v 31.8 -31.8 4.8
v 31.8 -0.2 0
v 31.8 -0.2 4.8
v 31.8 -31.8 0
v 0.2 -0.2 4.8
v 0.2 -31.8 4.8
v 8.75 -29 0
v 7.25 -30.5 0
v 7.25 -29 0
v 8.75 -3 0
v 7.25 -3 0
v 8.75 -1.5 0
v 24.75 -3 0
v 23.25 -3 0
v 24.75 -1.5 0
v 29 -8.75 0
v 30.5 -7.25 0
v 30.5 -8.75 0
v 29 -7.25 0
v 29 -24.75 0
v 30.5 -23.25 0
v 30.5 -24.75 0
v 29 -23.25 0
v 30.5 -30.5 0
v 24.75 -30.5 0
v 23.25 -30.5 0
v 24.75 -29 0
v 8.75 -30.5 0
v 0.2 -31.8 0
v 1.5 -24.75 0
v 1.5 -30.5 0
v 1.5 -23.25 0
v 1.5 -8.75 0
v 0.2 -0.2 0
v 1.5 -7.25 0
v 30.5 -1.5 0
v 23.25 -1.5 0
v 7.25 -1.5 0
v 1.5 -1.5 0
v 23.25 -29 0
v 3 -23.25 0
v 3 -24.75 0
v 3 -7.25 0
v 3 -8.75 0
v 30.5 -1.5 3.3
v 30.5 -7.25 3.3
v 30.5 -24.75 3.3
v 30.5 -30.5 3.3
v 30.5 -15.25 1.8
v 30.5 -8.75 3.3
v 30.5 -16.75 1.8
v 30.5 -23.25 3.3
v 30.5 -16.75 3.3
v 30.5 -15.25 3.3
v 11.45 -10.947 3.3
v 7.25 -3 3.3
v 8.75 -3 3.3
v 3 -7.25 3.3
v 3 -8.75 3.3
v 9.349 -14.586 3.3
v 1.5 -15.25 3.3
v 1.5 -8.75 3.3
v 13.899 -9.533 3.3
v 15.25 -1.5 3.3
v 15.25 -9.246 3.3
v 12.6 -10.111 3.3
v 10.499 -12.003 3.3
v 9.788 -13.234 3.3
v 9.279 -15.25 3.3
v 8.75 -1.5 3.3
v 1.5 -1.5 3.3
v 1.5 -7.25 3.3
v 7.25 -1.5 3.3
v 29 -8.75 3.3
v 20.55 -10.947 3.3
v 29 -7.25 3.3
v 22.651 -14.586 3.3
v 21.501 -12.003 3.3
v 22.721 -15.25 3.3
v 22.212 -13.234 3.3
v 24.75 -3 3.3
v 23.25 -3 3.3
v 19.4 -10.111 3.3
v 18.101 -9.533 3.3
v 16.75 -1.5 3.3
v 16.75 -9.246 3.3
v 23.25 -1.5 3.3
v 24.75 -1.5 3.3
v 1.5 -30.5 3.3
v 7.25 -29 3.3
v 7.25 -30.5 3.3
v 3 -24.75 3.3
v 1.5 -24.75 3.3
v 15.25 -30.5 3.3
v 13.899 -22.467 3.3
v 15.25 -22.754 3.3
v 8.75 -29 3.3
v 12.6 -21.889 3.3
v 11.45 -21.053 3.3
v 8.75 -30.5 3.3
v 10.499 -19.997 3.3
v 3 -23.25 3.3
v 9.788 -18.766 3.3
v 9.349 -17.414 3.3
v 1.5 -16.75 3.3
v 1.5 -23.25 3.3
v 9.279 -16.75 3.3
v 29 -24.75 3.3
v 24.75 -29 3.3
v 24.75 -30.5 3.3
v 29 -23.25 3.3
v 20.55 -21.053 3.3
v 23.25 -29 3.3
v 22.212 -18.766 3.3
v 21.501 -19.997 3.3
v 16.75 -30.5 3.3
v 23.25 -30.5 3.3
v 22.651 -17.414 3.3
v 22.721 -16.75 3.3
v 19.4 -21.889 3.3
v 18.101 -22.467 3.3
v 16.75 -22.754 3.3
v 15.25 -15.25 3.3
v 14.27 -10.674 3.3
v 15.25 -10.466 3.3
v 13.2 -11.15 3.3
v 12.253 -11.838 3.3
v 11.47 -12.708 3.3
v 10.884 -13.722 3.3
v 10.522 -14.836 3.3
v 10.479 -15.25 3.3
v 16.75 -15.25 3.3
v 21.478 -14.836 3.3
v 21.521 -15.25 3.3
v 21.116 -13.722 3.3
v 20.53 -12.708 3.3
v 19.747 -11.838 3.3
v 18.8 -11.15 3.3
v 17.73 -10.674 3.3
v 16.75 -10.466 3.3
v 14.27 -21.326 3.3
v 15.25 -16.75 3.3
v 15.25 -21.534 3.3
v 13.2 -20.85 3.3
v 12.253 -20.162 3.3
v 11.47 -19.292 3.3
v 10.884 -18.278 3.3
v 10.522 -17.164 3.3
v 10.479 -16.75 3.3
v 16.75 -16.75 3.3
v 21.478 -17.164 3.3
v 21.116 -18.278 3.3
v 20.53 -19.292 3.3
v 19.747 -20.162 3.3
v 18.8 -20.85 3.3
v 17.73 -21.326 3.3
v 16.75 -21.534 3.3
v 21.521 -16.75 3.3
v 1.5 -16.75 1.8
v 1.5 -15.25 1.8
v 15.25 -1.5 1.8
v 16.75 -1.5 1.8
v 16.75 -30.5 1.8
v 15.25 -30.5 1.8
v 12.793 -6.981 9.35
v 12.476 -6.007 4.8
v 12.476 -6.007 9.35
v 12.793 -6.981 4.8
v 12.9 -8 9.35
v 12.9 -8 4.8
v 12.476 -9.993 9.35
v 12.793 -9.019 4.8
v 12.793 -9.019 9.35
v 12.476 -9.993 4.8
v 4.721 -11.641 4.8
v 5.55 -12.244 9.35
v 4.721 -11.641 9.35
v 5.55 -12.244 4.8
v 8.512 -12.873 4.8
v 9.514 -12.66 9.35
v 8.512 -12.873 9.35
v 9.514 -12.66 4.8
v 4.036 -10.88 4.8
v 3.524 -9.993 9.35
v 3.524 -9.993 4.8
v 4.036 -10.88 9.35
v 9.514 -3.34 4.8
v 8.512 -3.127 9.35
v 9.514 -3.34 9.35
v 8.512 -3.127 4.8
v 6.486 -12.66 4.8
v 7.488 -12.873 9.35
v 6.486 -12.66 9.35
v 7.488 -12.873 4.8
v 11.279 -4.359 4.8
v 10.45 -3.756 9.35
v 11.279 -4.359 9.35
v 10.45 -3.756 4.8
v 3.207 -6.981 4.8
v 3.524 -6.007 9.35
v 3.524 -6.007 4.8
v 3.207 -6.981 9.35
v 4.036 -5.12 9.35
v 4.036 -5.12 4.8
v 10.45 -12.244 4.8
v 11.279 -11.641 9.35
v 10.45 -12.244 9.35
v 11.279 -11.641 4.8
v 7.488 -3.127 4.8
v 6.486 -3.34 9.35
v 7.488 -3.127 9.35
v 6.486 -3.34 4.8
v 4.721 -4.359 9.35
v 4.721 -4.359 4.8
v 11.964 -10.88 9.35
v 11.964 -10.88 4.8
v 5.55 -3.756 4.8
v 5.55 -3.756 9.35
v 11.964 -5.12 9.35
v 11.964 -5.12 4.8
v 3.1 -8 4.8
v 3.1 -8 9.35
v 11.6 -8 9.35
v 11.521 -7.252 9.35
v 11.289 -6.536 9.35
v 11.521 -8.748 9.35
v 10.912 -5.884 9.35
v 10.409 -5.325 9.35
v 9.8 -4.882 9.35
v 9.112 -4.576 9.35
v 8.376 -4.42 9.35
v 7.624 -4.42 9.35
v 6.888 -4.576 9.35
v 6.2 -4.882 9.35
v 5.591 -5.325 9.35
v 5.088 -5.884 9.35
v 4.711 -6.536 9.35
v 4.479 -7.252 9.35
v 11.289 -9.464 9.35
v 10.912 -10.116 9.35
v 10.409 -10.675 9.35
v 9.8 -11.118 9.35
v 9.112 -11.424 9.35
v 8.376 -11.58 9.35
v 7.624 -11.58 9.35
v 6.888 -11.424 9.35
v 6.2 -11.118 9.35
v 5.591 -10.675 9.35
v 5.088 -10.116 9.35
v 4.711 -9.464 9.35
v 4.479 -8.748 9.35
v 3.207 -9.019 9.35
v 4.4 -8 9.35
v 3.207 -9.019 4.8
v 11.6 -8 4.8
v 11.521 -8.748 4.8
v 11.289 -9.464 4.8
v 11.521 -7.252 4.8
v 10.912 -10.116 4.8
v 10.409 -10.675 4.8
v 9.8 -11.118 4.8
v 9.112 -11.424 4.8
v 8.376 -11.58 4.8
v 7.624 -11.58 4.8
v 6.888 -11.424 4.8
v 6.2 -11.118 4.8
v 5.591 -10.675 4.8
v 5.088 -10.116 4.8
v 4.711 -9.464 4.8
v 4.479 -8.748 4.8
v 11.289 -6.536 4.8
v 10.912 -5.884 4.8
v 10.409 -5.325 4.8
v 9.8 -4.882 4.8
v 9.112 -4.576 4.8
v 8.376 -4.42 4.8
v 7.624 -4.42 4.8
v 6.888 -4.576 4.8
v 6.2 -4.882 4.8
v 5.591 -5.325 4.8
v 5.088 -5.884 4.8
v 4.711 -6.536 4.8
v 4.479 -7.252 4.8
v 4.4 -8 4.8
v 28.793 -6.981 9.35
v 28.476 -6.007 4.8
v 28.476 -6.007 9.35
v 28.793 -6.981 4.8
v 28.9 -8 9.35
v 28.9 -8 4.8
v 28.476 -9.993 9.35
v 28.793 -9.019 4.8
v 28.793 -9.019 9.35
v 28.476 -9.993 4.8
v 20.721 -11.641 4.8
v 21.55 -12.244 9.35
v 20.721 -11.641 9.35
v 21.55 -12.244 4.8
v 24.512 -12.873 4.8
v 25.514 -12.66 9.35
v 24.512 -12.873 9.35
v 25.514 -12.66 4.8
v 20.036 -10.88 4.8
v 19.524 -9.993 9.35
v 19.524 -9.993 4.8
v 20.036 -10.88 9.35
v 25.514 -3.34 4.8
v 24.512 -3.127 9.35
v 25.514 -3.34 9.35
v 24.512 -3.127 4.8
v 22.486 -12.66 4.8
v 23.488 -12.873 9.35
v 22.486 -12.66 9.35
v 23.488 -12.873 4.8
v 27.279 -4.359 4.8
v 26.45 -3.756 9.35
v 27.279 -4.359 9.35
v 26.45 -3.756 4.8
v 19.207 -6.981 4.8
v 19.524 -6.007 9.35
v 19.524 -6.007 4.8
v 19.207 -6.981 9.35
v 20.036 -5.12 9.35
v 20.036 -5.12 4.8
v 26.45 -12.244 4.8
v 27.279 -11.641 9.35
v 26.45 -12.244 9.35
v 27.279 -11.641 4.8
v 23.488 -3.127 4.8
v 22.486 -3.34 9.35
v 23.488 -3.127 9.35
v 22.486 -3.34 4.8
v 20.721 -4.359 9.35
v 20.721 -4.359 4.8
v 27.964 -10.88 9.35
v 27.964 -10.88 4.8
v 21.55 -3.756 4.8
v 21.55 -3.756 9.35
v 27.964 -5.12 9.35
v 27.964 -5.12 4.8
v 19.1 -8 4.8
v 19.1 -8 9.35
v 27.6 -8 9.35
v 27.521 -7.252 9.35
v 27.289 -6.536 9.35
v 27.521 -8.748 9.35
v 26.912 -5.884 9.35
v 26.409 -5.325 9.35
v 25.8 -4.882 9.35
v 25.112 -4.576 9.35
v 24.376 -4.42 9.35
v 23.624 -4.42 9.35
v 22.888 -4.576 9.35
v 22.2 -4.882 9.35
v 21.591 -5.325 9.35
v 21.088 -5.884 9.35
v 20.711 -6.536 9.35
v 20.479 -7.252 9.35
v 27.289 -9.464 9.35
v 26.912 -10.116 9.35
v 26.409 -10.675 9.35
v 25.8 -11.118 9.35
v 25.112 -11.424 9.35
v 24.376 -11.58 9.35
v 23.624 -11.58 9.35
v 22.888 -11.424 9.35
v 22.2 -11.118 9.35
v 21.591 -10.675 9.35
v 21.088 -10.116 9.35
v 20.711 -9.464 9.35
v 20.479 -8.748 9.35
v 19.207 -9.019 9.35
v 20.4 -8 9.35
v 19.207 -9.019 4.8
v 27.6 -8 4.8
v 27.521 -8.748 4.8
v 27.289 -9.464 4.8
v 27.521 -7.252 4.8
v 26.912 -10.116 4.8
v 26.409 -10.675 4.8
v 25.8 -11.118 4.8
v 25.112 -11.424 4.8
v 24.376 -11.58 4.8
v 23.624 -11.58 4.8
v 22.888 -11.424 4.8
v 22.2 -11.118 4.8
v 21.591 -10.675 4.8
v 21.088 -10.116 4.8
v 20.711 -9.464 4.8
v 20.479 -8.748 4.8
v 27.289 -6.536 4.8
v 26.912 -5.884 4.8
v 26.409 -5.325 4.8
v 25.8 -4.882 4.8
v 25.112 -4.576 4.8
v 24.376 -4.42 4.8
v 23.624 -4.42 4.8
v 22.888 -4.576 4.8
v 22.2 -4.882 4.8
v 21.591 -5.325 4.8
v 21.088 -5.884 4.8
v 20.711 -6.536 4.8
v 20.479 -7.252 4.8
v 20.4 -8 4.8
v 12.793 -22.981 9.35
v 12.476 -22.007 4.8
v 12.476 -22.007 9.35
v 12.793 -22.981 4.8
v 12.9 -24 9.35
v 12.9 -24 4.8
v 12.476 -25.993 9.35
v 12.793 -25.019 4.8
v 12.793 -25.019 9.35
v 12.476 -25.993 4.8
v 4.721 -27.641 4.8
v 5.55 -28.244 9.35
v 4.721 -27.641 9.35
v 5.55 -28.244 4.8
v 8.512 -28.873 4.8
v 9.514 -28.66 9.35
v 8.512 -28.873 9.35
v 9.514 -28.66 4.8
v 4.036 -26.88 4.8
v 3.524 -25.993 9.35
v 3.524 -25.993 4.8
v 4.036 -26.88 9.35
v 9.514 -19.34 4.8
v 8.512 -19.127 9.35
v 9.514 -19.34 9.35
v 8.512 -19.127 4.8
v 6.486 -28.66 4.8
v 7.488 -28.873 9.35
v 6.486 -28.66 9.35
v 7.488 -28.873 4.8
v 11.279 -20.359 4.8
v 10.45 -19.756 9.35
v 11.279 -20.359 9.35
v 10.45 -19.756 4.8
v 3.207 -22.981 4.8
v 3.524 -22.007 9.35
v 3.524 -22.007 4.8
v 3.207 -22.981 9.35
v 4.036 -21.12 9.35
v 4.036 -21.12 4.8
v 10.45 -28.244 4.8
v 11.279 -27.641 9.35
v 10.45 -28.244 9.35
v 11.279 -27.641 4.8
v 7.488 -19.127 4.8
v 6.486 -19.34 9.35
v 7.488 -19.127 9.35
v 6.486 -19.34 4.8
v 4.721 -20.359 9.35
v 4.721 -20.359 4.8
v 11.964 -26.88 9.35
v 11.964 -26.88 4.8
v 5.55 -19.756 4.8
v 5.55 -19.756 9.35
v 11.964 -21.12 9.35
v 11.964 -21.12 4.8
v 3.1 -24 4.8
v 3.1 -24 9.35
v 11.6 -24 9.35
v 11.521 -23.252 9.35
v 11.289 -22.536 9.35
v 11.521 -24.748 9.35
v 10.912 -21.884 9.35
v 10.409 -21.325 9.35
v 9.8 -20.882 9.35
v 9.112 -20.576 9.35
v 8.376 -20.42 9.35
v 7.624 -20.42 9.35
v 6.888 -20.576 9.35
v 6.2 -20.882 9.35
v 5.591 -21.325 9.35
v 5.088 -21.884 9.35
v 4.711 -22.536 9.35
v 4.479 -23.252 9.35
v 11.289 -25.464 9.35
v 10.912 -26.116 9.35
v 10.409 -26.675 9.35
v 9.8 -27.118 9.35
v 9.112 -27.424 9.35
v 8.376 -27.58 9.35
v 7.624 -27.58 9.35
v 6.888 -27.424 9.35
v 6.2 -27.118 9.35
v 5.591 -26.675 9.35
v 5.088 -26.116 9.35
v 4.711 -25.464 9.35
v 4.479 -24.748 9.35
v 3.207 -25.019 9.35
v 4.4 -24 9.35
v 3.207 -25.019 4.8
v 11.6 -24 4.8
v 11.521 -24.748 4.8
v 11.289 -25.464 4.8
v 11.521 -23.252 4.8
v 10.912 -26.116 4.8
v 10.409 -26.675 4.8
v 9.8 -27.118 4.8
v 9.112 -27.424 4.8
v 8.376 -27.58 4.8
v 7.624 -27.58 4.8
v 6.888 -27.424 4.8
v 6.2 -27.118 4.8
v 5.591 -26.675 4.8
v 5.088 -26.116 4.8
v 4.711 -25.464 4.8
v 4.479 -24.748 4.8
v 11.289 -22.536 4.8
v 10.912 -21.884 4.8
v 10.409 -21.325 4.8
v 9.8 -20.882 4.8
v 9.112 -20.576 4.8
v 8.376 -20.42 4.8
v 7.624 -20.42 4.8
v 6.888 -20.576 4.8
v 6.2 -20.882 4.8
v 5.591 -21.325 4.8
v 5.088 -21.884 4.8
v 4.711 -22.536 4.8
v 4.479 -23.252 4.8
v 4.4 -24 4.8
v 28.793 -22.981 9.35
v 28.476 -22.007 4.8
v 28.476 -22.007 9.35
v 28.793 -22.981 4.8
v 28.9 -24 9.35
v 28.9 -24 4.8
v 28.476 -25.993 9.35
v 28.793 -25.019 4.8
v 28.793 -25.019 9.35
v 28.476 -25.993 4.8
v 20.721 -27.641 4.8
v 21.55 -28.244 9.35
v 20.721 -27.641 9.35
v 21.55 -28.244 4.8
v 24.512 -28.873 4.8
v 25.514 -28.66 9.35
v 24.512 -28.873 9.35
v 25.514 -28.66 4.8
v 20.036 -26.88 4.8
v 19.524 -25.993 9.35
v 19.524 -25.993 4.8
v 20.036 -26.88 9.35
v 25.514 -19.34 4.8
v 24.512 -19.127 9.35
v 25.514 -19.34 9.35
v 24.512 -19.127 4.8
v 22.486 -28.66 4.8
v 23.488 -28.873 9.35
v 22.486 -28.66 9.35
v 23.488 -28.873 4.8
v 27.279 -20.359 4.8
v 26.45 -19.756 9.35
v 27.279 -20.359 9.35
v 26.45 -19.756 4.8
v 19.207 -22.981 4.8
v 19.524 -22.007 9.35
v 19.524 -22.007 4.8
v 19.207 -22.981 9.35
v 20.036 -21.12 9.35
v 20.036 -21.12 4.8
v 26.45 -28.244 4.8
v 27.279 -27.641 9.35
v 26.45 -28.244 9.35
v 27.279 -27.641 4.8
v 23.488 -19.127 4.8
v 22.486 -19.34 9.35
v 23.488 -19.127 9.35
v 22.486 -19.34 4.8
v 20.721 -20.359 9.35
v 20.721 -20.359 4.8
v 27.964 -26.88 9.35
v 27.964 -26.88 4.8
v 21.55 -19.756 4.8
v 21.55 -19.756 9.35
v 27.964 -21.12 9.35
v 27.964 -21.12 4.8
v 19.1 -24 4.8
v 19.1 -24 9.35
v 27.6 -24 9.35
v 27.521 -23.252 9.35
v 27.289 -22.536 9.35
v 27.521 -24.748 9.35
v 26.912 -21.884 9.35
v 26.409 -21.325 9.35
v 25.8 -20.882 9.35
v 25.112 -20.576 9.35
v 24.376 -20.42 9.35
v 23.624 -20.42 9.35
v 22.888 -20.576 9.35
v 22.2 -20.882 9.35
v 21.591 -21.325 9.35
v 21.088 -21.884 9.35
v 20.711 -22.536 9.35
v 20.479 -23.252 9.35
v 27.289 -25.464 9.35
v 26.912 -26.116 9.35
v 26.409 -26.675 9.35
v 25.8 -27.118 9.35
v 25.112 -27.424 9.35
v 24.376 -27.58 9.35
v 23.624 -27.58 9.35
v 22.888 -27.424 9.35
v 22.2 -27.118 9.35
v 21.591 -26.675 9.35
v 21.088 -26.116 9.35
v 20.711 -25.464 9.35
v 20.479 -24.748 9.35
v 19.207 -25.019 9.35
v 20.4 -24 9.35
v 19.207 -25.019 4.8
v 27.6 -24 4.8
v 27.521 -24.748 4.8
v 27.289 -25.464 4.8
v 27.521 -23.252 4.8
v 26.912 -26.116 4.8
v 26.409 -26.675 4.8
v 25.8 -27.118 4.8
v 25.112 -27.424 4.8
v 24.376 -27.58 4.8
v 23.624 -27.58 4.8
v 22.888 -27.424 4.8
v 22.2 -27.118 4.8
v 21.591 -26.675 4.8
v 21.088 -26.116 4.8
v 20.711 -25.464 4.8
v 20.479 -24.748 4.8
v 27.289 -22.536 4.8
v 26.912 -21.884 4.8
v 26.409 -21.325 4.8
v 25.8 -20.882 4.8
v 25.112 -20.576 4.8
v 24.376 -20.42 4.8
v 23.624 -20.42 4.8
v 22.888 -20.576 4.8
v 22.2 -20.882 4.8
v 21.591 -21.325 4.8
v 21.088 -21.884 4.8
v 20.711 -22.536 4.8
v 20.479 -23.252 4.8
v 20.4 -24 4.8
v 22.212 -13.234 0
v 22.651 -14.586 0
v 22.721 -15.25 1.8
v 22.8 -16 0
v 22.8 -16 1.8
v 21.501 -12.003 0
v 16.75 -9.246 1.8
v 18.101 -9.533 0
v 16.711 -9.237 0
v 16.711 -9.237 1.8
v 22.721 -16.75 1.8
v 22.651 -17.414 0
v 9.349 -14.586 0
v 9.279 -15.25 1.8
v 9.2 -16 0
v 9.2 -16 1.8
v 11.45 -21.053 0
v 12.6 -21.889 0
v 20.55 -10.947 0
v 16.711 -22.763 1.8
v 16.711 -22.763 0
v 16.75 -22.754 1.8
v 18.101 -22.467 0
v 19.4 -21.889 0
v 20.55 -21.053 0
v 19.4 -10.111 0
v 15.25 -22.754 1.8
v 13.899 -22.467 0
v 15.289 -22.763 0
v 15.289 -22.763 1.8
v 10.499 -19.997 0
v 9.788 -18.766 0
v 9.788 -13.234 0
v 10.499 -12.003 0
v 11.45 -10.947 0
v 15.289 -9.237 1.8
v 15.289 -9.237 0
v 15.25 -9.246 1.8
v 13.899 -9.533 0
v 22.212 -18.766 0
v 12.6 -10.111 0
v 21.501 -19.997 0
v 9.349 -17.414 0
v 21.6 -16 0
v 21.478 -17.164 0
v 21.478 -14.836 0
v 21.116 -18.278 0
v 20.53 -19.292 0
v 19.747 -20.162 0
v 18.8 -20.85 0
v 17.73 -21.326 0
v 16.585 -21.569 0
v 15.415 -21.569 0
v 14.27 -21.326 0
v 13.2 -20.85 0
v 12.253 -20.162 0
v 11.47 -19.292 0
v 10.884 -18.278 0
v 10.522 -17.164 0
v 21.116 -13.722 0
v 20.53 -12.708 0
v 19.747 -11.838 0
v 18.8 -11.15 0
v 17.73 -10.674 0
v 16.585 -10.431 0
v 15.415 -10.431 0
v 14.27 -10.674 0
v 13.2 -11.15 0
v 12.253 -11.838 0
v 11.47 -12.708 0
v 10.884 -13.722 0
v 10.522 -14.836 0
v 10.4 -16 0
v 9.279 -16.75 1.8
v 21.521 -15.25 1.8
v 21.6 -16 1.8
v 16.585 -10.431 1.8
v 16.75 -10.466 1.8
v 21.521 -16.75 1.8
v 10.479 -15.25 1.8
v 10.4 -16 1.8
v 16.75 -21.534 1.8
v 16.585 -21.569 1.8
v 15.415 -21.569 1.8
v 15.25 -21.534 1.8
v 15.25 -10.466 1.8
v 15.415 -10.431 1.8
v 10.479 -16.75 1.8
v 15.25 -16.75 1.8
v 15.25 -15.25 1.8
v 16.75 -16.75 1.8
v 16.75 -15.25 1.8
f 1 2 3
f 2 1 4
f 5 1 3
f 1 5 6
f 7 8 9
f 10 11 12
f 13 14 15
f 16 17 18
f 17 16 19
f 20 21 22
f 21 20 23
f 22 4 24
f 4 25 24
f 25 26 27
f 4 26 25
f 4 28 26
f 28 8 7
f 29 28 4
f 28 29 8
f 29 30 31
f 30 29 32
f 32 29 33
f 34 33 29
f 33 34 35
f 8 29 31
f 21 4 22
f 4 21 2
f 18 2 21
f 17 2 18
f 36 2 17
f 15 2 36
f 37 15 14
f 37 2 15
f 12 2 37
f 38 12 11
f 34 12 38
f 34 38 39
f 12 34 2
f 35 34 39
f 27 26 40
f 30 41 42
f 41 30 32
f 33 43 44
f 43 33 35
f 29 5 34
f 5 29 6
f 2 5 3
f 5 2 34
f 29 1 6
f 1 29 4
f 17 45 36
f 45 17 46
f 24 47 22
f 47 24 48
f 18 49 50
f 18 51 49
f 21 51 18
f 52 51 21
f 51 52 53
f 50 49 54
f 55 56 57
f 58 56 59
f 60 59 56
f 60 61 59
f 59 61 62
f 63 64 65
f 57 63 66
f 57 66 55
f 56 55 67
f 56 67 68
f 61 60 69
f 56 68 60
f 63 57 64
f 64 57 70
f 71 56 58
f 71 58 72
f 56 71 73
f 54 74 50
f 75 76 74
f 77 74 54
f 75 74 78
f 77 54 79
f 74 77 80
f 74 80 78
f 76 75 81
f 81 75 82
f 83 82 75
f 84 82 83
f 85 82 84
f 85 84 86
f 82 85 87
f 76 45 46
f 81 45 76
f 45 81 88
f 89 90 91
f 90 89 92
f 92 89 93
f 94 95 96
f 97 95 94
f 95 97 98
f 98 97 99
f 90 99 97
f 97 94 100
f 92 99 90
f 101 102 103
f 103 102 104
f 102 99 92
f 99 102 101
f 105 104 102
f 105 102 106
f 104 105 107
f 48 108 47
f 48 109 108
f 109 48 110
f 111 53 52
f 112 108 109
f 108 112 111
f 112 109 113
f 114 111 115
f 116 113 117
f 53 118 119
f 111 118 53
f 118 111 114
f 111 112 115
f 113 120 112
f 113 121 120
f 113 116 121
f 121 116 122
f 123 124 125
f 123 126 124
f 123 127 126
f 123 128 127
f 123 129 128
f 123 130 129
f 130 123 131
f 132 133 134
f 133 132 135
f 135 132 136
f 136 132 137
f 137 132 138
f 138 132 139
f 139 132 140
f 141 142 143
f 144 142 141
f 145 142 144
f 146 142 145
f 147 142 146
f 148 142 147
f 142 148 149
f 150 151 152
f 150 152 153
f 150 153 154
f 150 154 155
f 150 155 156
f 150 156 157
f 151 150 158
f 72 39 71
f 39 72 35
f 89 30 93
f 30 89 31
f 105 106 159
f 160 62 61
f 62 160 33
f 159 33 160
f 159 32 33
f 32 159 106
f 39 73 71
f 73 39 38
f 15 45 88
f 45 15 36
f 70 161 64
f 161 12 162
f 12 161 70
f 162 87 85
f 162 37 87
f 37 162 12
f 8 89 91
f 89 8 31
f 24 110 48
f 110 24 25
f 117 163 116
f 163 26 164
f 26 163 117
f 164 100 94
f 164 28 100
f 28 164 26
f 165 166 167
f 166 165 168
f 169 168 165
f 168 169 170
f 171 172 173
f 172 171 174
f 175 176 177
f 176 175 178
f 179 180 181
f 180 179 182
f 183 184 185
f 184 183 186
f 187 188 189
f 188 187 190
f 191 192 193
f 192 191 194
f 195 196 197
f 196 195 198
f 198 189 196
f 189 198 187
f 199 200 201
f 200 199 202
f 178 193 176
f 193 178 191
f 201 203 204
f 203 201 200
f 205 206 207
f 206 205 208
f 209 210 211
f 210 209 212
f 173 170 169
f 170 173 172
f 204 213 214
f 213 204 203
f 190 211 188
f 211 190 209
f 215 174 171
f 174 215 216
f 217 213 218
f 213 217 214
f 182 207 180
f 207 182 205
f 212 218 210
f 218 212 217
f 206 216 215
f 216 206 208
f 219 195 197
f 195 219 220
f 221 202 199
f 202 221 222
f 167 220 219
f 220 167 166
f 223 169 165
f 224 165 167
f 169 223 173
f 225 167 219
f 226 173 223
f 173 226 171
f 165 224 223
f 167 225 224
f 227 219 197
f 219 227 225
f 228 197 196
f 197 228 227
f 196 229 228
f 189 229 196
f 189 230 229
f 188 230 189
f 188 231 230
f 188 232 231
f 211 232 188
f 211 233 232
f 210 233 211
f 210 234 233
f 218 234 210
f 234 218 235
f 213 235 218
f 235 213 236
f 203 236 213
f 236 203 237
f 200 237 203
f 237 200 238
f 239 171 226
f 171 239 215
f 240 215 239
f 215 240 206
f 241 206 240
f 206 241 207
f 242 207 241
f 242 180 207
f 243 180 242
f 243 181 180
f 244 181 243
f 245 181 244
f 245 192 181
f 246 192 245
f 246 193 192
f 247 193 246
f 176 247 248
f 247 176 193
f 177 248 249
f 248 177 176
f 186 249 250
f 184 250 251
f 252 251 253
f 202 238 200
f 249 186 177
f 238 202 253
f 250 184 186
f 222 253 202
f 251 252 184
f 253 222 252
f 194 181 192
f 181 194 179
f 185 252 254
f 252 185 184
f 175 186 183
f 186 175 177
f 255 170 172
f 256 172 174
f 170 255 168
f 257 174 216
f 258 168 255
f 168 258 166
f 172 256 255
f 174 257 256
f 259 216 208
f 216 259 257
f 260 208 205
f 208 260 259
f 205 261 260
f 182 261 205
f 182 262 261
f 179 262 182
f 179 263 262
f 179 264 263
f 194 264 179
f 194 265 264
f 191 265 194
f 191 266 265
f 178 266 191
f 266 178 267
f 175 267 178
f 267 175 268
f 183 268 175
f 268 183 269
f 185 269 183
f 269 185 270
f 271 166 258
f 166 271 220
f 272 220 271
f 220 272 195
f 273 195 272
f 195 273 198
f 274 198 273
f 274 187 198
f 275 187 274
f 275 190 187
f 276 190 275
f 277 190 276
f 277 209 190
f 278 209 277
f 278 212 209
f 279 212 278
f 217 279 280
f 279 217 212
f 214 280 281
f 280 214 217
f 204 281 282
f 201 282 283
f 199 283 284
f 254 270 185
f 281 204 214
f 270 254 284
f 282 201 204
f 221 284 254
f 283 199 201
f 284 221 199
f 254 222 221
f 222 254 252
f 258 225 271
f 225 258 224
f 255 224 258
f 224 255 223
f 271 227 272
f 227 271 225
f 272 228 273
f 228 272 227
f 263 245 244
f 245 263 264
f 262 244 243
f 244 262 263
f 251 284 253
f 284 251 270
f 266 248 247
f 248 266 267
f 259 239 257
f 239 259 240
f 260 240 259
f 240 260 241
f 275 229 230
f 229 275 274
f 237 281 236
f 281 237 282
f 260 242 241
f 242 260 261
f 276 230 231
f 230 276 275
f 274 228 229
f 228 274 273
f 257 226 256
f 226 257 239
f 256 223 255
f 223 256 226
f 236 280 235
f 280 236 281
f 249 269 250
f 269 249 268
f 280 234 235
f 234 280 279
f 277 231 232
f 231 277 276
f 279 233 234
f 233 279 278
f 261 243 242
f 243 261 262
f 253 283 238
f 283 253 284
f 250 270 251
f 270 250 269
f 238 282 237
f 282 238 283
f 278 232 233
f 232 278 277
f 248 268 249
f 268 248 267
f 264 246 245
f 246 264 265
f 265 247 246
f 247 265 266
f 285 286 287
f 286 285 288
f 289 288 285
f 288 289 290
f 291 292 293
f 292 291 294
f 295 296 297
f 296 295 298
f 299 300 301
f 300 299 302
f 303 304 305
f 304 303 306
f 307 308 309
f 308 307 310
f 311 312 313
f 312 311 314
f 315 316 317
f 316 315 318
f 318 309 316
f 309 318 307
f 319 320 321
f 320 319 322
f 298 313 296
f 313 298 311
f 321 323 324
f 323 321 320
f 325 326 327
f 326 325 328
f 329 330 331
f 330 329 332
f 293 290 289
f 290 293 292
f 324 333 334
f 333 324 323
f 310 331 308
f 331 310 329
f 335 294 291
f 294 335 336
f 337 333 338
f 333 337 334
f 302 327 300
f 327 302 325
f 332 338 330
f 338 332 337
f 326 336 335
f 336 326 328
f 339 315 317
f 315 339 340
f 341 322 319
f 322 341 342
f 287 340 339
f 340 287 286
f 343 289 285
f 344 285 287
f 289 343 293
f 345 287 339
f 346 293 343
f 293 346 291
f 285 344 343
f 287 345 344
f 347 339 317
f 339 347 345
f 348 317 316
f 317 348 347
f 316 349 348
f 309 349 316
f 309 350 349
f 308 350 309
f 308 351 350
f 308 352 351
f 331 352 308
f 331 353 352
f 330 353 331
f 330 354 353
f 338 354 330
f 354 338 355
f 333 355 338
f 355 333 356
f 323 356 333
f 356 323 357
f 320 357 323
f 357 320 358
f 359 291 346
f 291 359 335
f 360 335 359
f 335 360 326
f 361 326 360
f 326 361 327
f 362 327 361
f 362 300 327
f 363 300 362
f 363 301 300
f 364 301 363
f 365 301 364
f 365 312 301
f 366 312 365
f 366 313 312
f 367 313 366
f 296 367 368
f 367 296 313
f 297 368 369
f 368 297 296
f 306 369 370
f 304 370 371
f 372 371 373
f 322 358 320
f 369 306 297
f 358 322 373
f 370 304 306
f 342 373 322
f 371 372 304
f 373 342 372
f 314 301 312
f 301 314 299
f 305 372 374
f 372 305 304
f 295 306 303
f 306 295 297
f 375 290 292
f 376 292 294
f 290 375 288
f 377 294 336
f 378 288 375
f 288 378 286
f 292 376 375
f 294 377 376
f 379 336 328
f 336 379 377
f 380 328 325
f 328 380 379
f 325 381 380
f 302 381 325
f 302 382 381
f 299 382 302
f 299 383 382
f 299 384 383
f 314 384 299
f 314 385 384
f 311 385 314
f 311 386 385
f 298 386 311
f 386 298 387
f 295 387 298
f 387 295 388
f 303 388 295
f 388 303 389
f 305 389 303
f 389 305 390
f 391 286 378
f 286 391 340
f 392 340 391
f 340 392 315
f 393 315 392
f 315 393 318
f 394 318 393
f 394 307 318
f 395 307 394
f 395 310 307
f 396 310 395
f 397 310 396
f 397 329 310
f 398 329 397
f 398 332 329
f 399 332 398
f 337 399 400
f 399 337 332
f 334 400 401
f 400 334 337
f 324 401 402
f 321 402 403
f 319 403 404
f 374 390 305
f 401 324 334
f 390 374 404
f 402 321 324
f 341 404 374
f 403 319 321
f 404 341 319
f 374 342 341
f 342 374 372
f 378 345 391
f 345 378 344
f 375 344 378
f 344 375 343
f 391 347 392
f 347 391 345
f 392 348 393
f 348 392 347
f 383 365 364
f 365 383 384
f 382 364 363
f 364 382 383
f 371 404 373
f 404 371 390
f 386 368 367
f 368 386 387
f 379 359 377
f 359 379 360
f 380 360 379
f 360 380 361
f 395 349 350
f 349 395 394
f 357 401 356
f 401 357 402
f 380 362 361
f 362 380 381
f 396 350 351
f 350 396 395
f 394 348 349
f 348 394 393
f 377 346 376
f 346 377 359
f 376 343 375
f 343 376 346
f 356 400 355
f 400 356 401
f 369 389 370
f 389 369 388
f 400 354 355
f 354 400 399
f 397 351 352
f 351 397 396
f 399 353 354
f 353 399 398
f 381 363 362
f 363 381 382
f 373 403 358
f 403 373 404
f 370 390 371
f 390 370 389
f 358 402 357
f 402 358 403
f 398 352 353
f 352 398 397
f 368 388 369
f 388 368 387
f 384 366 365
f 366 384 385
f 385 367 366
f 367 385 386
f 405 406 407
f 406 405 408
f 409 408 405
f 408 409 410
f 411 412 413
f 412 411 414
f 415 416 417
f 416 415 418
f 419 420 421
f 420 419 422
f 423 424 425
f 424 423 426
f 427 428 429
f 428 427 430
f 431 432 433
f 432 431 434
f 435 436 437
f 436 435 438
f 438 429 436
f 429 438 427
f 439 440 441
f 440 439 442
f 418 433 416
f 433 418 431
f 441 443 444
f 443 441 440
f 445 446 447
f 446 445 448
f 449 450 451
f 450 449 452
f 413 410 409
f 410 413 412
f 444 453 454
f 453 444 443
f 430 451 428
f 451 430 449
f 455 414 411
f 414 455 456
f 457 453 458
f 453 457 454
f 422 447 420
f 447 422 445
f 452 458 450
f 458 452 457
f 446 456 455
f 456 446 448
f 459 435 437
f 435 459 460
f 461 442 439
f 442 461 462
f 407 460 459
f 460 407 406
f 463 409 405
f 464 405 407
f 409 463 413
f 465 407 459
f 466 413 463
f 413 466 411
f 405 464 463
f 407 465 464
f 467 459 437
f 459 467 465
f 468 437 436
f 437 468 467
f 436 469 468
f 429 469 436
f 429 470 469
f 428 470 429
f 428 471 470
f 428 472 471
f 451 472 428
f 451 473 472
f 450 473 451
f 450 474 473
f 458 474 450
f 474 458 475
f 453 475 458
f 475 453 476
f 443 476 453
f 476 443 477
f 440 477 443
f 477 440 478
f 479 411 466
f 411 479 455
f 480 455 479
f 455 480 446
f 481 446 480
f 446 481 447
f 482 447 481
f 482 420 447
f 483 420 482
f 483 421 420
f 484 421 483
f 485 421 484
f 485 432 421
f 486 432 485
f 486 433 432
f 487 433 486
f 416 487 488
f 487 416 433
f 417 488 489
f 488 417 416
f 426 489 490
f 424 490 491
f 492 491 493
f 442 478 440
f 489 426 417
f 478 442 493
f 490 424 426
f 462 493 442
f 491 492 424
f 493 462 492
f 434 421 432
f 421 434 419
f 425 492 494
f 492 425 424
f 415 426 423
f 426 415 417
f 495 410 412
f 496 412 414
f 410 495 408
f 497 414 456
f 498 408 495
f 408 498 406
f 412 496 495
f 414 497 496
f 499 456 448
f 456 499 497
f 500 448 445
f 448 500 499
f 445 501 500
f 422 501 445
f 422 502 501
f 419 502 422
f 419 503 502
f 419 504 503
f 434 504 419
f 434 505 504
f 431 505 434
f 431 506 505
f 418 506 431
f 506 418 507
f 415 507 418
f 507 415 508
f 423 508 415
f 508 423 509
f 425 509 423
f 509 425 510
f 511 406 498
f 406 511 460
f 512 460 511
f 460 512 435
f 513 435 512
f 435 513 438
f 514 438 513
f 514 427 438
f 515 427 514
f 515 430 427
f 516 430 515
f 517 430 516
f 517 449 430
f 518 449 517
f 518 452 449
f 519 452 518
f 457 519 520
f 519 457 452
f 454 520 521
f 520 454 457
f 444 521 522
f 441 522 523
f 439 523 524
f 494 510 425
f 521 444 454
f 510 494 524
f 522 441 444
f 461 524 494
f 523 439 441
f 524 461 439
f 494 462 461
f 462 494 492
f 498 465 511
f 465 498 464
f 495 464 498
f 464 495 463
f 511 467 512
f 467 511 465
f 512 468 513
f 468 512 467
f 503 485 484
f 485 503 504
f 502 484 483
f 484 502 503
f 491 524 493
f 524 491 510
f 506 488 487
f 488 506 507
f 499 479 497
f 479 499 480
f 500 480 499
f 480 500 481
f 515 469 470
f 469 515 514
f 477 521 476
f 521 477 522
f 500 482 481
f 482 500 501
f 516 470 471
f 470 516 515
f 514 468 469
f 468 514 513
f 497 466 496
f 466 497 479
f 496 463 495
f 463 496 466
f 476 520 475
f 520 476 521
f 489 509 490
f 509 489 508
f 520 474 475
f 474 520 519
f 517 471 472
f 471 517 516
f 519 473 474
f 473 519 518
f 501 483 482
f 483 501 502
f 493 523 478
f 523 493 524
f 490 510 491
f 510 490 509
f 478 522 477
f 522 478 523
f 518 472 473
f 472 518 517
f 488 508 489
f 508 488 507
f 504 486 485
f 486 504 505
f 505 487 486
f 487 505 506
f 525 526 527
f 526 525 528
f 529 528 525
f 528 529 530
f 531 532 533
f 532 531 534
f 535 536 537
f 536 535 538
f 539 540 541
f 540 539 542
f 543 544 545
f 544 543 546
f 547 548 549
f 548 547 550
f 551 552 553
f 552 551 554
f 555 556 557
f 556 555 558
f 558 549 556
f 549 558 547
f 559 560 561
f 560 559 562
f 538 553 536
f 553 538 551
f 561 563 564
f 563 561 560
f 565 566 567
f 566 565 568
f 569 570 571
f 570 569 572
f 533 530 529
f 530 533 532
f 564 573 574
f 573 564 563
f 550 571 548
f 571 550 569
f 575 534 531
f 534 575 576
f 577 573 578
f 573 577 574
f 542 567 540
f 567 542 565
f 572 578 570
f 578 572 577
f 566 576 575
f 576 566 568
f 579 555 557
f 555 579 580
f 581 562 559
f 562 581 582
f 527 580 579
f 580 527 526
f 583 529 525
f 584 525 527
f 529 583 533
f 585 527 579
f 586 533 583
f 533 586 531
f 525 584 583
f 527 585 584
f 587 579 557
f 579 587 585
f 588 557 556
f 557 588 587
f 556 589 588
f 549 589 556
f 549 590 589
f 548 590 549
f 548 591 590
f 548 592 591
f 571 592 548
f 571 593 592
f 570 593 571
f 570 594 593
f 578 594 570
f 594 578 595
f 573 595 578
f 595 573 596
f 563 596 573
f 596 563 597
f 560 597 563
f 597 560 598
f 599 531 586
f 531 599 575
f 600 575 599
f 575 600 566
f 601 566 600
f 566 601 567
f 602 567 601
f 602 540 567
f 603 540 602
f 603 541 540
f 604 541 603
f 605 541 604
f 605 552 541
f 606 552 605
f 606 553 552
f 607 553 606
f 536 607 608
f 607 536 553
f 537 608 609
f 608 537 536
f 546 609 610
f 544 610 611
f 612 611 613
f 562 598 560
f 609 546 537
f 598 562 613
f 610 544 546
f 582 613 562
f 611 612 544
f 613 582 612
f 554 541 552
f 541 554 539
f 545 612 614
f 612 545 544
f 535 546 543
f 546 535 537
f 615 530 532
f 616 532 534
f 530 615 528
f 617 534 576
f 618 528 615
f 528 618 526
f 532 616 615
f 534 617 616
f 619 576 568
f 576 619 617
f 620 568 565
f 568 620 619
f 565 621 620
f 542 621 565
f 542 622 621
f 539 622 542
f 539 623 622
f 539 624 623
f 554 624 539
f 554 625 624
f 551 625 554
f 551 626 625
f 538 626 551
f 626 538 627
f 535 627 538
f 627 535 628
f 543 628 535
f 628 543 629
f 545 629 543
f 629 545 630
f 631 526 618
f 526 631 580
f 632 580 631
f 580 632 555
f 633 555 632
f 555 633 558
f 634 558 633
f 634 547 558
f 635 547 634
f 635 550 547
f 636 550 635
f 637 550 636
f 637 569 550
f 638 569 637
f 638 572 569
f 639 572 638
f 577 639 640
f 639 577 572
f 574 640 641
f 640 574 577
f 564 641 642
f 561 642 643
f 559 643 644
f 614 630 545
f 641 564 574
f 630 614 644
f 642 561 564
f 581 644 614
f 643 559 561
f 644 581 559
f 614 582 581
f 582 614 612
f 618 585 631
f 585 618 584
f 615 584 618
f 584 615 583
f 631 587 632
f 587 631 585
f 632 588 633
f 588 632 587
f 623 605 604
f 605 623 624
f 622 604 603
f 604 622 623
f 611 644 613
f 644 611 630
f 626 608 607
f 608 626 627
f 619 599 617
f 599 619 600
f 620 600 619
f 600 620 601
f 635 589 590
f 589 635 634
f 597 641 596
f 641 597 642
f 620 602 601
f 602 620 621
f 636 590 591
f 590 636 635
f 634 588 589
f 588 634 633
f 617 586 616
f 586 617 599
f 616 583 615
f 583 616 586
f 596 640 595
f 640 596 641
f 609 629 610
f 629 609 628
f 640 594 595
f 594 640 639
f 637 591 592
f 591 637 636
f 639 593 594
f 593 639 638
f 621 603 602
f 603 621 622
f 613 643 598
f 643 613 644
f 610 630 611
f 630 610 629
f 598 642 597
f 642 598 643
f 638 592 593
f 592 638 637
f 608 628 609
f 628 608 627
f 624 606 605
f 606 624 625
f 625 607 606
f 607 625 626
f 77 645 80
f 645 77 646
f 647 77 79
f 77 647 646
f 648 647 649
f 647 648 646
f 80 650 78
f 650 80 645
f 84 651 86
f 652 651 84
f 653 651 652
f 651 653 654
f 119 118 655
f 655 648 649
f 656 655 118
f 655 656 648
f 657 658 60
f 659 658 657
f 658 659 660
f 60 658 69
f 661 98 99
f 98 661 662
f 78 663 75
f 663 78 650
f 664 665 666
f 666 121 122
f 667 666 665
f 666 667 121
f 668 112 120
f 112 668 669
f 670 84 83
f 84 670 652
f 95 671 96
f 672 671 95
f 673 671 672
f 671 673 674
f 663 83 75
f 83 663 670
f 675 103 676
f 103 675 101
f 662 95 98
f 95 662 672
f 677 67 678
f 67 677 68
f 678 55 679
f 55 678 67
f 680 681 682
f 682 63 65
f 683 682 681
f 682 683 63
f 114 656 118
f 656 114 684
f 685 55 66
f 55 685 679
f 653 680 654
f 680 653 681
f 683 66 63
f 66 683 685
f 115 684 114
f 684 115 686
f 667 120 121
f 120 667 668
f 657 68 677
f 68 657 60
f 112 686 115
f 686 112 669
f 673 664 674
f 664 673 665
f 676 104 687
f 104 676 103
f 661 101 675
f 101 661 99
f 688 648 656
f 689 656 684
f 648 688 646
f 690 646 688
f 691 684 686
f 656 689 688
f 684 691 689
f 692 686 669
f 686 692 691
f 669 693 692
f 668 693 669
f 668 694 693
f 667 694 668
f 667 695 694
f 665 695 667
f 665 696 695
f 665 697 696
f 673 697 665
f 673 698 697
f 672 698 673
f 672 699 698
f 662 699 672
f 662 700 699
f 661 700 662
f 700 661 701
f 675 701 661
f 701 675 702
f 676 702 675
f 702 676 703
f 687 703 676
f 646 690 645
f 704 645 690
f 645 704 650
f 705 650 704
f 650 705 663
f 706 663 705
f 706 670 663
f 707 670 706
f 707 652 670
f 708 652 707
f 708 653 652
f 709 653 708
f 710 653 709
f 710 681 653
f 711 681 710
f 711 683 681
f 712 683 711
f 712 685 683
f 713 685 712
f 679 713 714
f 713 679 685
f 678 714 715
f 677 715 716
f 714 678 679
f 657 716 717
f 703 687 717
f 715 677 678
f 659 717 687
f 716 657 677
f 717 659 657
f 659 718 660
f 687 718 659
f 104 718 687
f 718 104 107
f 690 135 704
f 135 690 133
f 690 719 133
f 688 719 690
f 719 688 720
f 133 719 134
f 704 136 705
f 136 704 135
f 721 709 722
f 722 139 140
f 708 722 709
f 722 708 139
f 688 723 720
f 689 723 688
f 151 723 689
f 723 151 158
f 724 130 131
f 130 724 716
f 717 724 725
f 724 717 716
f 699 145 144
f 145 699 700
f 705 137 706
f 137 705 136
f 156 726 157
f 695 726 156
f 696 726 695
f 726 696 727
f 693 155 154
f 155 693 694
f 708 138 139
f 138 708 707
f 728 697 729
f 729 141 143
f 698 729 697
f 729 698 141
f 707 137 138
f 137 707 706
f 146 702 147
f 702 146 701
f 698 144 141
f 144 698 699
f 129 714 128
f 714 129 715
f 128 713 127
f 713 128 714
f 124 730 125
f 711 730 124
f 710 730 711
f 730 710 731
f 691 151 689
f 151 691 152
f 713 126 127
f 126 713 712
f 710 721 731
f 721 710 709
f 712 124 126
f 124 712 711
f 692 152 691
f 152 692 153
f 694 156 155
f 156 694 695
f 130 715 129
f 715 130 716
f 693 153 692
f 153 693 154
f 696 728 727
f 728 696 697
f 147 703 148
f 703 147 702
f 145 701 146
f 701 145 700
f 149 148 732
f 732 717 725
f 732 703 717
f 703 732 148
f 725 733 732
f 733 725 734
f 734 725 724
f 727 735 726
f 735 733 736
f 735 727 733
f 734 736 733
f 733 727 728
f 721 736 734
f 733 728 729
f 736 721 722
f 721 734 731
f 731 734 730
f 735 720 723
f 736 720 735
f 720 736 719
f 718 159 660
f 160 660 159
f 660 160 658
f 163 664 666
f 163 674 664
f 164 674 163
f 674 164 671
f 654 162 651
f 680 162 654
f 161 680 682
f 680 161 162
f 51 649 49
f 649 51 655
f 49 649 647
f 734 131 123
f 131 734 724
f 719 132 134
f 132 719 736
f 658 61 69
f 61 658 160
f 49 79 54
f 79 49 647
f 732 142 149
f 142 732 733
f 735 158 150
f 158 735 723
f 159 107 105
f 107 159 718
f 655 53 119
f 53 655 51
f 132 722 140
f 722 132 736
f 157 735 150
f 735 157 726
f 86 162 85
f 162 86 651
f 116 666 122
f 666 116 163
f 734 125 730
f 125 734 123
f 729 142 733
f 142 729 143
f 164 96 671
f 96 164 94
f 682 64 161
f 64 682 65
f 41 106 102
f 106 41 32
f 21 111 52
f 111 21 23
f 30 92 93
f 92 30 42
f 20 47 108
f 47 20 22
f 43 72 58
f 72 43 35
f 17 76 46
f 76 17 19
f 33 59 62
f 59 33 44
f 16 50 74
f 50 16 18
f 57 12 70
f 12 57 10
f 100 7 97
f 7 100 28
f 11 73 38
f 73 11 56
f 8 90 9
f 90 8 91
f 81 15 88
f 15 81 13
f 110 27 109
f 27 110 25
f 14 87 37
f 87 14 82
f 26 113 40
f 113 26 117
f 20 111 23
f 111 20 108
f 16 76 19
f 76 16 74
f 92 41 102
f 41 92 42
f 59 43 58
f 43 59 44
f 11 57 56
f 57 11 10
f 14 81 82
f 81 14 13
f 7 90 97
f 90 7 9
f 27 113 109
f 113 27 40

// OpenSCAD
// file: lib/doblo-params-felixtec4.scad
/*
 Copyright (c) 2013 Daniel M. Taub
 Copyright (c) 2010 Daniel K. Schneider
 
 This file is part of DobloFactory.

 DobloFactory is free source: you can redistribute it and/or modify
    modify it under the terms of the CC BY-NC-SA 3.0 License:
    CreativeCommons Attribution-NonCommerical-ShareAlike 3.0
    as published by Creative Commons. 

    You should have received a copy of the CC BY-NC-SA 3.0 License 
    with this source package. 
    If not, see <http://creativecommons.org/licenses/by-nc-sa/3.0/>

-------------------------
PARAMETERS              -
-------------------------

These parameters define in principle all dimensions of lego and duplo compatible blocks

Close to DUPLO dimensions by default, but underestimating Lego dimensions. Depending on your printer and your layer/thickness printing parameters you do want to change nibbles and walls.

The settings below are for a layer Thickness of 0.25mm and FAST printingh  !!! Tested with a Felix TEC4.1.

All units are mm.

Dimensions: 
* A typical small 2x2 nibbles on top DUPLO compatible brick with one nibble underneath is
32mm x 32mm x 19.2mm (plus a nibble height of 4.5mm)
* LEGO-compatible bricks are half that size in all three dimensions

*/

// Normal size (DUPLO)
// SCALE = 1;
// Lego size - see also the hacks in the code for fixing wall and nibble dimensions
// SCALE = 0.5 ;
// Mini Lego size / Nano - does not really work yet, but you can try
// SCALE = 0.25

// DATA FOR QUATRO (DMT)
// nibble outter diam: 18.45 
// nibble inner diam: 14.45 
// nibble inner nub(for duplo) diam: 13.25 

CADRO = 2; // not yet tested
DOBLO = 1;
LUGO = 0.5;
MINI = 0.25; // not tested much

/* SHAVE to correct inaccurate FDM printing, i.e. objects larger than they should be
This will be substracted from the outer wall. I you got a powder or resin printer, set to 0.
 */
SHAVE = 0.15; // about half extrusion size

/* Heights */
HALF = 3;
THIRD = 2;
THIRDx2 = 4;
FULL = 6;

// defines minimum size of a fragment of a nibble, e.g. set openscad $fs
// Smaller is better, but will take much more time for rendering and slicing
NIBBLE_FS = 0.5;
CYL_FS = 2;

// LEGO SCALE - don't change, allows to create nano legos, should be 1 if real Legos
function LEGO_SCALE(SCALE) = 2 * SCALE;

// Doblo block size
// Real DUPLO Block = 31.7 / 2 = 15.85 (with some variations)
function PART_WIDTH(SCALE) = 16.0 * SCALE;

// Block height (a typical block is 4 * PART_HEIGHT)
// Real Duplo Block = 19.17 / 4 = 4.8, we also measured 19.09, 19.16
function PART_HEIGHT(SCALE) = (SCALE < 0.6) ? (1.6 * LEGO_SCALE(SCALE)) : (3.2 * SCALE);
// Diamonds - size of anti-warping holes - used optionally
DIAMOND = 4;

// Top nibble size definitions
// Must be adjusted with respect to layer resolution and other slicing considerations
DUPLO_TOP_NIBBLE_RADIUS_ADJUSTMENT = 0.2;
DUPLO_BOTTOM_NIBBLE_RADIUS_ADJUSTMENT = 0.2;

function NO(SCALE) = PART_WIDTH(SCALE) / 2.0; //nibble offset
function NBO(SCALE) = PART_WIDTH(SCALE); // nibble bottom offset
function NH(SCALE) = (SCALE < 0.6) ? 1.75 * LEGO_SCALE(SCALE) : 4.55 * SCALE; // LEGO vs. DUPLO 
function NB_RADIUS(SCALE) = (SCALE < 0.6) ? (4.9 / 2 * LEGO_SCALE(SCALE)) : (9.4 / 2.0 * SCALE + DUPLO_TOP_NIBBLE_RADIUS_ADJUSTMENT); // Lego vs. DUPLO
// Real DUPLO Block = 9.38 

function NB_RADIUS_INSIDE(SCALE) = 6.8 / 2 * SCALE + DUPLO_TOP_NIBBLE_RADIUS_ADJUSTMENT;
// 6.44 = Real DUPLO block

function NB_THICKNESS(SCALE) = NB_RADIUS(SCALE) - NB_RADIUS_INSIDE(SCALE);

// For square nibble supports in 1xM or Nx1 blocks
function ALONG_LEN(SCALE) = (PART_WIDTH(SCALE) - NB_RADIUS(SCALE)) / 1.7; //tighter fit than 1.8
function CROSS_LEN(SCALE) = (PART_WIDTH(SCALE) - NB_RADIUS(SCALE) / 2);

// Bottom nibbles size definitions
// Must be adjusted with respect to layer resolution and other slicing considerations
// Real Lego bottom radius = 6.5 to 6.55
// function NB_BOTTOM_RADIUS(SCALE)        = (SCALE < 0.6) ? 6.5/2*LEGO_SCALE(SCALE) : 13.45/2*SCALE; // REAL
// Real DUPLO outside diameter = 13.48
function NB_BOTTOM_RADIUS(SCALE) = (SCALE < 0.6) ? 6.2 / 2 * LEGO_SCALE(SCALE) : 13.2 / 2 * SCALE + DUPLO_BOTTOM_NIBBLE_RADIUS_ADJUSTMENT; // FAKE

function NB_BOTTOM_RADIUS_THIN(SCALE) = (SCALE < 0.6) ? 3.5 / 2 * LEGO_SCALE(SCALE) : 7.2 / 2 * SCALE; // Note: not adjusted for thin version

function NB_BOTTOM_RADIUS_INSIDE(SCALE) = (SCALE < 0.6) ? 4.7 / 2 * LEGO_SCALE(SCALE) : 10.8 / 2 * SCALE + DUPLO_BOTTOM_NIBBLE_RADIUS_ADJUSTMENT;
// Real DUPLO inside diameter = 10.73
// rapman 10.6
// Real Lego = 4.9

// walls - IMPORTANT: must be adjusted with respect to layer resolution and other slicing considerations
// function DOBLOWALL(SCALE) = (SCALE < 0.6) ? 1.2 * LEGO_SCALE(SCALE): 1.55 *SCALE; // REAL
function DOBLOWALL(SCALE) = (SCALE < 0.6) ? 1.0 * LEGO_SCALE(SCALE) : 1.50 * SCALE; // FAKE to make walls smaller
// Lego vs. Duplo, Lego is not 2x smaller
// Real Lego = 1.2

function USE_INSET(SCALE) = (SCALE < 0.6) ? true : true;
function INSET_WIDTH(SCALE) = (SCALE < 0.6) ? 0.4 * LEGO_SCALE(SCALE) : 1.50 * SCALE; //little inset walls to make it stick
function INSET_LENGTH(SCALE) = (SCALE < 0.6) ? 3 * DOBLOWALL(SCALE) : 4 * DOBLOWALL(SCALE); // Legos have proportionally smaller insets

//lattice width and height (optional, see LATTICE_TYPE)
// A grid underneath the flat bridge, crossing through the nibbles underneath
function LATTICE_WIDTH(SCALE) = 1.50 * SCALE;

// 0 means none, 1 means more spacing (same as nibbles underneath),
// 2 means denser, i.e. more beams
// 3 means a full lattice grid that extends down the floor (ugly but more stable)
LATTICE_TYPE = 1;

// Sizes of a standard 2x2 square brick, normal height
// Not used, but are practical in your custom modules
function DOBLOWIDTH(SCALE) = PART_WIDTH(SCALE) * 2.0 * SCALE;
function DOBLOHEIGHT(SCALE) = PART_HEIGHT(SCALE) * 6.0 * SCALE;
function LEGOHEIGHT(SCALE) = PART_HEIGHT(SCALE) * 6.0 * SCALE;
// main file
/*
Doblo library usage example. For more information, please read:
https://edutechwiki.unige.ch/en/Doblo_factory#Using_openscad_doblo_modules

This is an example on how to use this library. It will create two simple objects.
- A: A lego brick with a block on top followed by an imported STL
- B: A lego brick with some nibbles and some 3D text on top

V1. Daniel.Schneider@unige.ch, April 2018

The owl was taken from https://www.thingiverse.com/thing:647060. I was made by Sailor96.
Low Poly Owl by Sailor96 is licensed under the Creative Commons - Attribution - Share Alike license.
(http://creativecommons.org/licenses/by-sa/3.0/)

*/

// Include the library plus default parameters
include <doblo-factory.scad>;
// include <lib/doblo-params.scad>; // in case you want to override
include <lib/doblo-params-felixtec4.scad>; // A modern fast PLA printer, slightly smaller walls underneath

/* uncomment one of these */

//A ();
B();
//C ();

module C() {
  /* A simple Lego compatible block, normal height */
  doblo(
    col=1,
    row=0,
    up=0,
    width=4,
    length=2,
    height=FULL,
    scale=LUGO,
    shave=0.2,
    nibbles_on_off=true
  );
}

module B() {
  /* A simple Duplo compatible block, half height */
  doblo(
    col=0,
    row=0,
    up=0,
    width=2,
    length=2,
    height=FULL / 4,
    shave=0.4,
    scale=DOBLO,
    nibbles_on_off=true
  );
}

module A() {
  /* Object A has three parts:
- a brick of size 6x4, 1/3rd height, no nibbles on top
- a block on top 2/3 height
- an imported owl on top (from the stls directory)
*/

  // ------ Create a 6x4 brick in position 0,0

  doblo(
    col=0,
    row=0,
    up=0,
    width=6,
    length=4,
    height=THIRD,
    nibbles_on_off=false
  );

  // put a block on top
  color("blue") block(col=0, row=0, up=THIRD, width=6, length=4, height=4);

  // Add the owl
  merge_stl(file="stls/Owl_LowPoly.stl", col=2, row=1.2, up=4, stl_z_offset_mm=0, shrink=2);

  // ------- Create a brick in position 10,0

  color("red") doblo(
      col=10,
      row=0,
      up=0,
      width=6,
      length=4,
      height=2 * THIRD,
      nibbles_on_off=false
    );

  difference() {
    // put a block on top
    color("green") block(col=10, row=0, up=2 * THIRD, width=6, length=4, height=THIRD);
    // ---- subtract some text
    #color("black") write(text="DOCK", col=10.1, row=1.5, up=5, size=12, height=3);
  }
  // --- add some nibbles
  nibbles(col=10, row=0, up=FULL, width=6, length=1);
  nibbles(col=10, row=3, up=FULL, width=6, length=1);
}
